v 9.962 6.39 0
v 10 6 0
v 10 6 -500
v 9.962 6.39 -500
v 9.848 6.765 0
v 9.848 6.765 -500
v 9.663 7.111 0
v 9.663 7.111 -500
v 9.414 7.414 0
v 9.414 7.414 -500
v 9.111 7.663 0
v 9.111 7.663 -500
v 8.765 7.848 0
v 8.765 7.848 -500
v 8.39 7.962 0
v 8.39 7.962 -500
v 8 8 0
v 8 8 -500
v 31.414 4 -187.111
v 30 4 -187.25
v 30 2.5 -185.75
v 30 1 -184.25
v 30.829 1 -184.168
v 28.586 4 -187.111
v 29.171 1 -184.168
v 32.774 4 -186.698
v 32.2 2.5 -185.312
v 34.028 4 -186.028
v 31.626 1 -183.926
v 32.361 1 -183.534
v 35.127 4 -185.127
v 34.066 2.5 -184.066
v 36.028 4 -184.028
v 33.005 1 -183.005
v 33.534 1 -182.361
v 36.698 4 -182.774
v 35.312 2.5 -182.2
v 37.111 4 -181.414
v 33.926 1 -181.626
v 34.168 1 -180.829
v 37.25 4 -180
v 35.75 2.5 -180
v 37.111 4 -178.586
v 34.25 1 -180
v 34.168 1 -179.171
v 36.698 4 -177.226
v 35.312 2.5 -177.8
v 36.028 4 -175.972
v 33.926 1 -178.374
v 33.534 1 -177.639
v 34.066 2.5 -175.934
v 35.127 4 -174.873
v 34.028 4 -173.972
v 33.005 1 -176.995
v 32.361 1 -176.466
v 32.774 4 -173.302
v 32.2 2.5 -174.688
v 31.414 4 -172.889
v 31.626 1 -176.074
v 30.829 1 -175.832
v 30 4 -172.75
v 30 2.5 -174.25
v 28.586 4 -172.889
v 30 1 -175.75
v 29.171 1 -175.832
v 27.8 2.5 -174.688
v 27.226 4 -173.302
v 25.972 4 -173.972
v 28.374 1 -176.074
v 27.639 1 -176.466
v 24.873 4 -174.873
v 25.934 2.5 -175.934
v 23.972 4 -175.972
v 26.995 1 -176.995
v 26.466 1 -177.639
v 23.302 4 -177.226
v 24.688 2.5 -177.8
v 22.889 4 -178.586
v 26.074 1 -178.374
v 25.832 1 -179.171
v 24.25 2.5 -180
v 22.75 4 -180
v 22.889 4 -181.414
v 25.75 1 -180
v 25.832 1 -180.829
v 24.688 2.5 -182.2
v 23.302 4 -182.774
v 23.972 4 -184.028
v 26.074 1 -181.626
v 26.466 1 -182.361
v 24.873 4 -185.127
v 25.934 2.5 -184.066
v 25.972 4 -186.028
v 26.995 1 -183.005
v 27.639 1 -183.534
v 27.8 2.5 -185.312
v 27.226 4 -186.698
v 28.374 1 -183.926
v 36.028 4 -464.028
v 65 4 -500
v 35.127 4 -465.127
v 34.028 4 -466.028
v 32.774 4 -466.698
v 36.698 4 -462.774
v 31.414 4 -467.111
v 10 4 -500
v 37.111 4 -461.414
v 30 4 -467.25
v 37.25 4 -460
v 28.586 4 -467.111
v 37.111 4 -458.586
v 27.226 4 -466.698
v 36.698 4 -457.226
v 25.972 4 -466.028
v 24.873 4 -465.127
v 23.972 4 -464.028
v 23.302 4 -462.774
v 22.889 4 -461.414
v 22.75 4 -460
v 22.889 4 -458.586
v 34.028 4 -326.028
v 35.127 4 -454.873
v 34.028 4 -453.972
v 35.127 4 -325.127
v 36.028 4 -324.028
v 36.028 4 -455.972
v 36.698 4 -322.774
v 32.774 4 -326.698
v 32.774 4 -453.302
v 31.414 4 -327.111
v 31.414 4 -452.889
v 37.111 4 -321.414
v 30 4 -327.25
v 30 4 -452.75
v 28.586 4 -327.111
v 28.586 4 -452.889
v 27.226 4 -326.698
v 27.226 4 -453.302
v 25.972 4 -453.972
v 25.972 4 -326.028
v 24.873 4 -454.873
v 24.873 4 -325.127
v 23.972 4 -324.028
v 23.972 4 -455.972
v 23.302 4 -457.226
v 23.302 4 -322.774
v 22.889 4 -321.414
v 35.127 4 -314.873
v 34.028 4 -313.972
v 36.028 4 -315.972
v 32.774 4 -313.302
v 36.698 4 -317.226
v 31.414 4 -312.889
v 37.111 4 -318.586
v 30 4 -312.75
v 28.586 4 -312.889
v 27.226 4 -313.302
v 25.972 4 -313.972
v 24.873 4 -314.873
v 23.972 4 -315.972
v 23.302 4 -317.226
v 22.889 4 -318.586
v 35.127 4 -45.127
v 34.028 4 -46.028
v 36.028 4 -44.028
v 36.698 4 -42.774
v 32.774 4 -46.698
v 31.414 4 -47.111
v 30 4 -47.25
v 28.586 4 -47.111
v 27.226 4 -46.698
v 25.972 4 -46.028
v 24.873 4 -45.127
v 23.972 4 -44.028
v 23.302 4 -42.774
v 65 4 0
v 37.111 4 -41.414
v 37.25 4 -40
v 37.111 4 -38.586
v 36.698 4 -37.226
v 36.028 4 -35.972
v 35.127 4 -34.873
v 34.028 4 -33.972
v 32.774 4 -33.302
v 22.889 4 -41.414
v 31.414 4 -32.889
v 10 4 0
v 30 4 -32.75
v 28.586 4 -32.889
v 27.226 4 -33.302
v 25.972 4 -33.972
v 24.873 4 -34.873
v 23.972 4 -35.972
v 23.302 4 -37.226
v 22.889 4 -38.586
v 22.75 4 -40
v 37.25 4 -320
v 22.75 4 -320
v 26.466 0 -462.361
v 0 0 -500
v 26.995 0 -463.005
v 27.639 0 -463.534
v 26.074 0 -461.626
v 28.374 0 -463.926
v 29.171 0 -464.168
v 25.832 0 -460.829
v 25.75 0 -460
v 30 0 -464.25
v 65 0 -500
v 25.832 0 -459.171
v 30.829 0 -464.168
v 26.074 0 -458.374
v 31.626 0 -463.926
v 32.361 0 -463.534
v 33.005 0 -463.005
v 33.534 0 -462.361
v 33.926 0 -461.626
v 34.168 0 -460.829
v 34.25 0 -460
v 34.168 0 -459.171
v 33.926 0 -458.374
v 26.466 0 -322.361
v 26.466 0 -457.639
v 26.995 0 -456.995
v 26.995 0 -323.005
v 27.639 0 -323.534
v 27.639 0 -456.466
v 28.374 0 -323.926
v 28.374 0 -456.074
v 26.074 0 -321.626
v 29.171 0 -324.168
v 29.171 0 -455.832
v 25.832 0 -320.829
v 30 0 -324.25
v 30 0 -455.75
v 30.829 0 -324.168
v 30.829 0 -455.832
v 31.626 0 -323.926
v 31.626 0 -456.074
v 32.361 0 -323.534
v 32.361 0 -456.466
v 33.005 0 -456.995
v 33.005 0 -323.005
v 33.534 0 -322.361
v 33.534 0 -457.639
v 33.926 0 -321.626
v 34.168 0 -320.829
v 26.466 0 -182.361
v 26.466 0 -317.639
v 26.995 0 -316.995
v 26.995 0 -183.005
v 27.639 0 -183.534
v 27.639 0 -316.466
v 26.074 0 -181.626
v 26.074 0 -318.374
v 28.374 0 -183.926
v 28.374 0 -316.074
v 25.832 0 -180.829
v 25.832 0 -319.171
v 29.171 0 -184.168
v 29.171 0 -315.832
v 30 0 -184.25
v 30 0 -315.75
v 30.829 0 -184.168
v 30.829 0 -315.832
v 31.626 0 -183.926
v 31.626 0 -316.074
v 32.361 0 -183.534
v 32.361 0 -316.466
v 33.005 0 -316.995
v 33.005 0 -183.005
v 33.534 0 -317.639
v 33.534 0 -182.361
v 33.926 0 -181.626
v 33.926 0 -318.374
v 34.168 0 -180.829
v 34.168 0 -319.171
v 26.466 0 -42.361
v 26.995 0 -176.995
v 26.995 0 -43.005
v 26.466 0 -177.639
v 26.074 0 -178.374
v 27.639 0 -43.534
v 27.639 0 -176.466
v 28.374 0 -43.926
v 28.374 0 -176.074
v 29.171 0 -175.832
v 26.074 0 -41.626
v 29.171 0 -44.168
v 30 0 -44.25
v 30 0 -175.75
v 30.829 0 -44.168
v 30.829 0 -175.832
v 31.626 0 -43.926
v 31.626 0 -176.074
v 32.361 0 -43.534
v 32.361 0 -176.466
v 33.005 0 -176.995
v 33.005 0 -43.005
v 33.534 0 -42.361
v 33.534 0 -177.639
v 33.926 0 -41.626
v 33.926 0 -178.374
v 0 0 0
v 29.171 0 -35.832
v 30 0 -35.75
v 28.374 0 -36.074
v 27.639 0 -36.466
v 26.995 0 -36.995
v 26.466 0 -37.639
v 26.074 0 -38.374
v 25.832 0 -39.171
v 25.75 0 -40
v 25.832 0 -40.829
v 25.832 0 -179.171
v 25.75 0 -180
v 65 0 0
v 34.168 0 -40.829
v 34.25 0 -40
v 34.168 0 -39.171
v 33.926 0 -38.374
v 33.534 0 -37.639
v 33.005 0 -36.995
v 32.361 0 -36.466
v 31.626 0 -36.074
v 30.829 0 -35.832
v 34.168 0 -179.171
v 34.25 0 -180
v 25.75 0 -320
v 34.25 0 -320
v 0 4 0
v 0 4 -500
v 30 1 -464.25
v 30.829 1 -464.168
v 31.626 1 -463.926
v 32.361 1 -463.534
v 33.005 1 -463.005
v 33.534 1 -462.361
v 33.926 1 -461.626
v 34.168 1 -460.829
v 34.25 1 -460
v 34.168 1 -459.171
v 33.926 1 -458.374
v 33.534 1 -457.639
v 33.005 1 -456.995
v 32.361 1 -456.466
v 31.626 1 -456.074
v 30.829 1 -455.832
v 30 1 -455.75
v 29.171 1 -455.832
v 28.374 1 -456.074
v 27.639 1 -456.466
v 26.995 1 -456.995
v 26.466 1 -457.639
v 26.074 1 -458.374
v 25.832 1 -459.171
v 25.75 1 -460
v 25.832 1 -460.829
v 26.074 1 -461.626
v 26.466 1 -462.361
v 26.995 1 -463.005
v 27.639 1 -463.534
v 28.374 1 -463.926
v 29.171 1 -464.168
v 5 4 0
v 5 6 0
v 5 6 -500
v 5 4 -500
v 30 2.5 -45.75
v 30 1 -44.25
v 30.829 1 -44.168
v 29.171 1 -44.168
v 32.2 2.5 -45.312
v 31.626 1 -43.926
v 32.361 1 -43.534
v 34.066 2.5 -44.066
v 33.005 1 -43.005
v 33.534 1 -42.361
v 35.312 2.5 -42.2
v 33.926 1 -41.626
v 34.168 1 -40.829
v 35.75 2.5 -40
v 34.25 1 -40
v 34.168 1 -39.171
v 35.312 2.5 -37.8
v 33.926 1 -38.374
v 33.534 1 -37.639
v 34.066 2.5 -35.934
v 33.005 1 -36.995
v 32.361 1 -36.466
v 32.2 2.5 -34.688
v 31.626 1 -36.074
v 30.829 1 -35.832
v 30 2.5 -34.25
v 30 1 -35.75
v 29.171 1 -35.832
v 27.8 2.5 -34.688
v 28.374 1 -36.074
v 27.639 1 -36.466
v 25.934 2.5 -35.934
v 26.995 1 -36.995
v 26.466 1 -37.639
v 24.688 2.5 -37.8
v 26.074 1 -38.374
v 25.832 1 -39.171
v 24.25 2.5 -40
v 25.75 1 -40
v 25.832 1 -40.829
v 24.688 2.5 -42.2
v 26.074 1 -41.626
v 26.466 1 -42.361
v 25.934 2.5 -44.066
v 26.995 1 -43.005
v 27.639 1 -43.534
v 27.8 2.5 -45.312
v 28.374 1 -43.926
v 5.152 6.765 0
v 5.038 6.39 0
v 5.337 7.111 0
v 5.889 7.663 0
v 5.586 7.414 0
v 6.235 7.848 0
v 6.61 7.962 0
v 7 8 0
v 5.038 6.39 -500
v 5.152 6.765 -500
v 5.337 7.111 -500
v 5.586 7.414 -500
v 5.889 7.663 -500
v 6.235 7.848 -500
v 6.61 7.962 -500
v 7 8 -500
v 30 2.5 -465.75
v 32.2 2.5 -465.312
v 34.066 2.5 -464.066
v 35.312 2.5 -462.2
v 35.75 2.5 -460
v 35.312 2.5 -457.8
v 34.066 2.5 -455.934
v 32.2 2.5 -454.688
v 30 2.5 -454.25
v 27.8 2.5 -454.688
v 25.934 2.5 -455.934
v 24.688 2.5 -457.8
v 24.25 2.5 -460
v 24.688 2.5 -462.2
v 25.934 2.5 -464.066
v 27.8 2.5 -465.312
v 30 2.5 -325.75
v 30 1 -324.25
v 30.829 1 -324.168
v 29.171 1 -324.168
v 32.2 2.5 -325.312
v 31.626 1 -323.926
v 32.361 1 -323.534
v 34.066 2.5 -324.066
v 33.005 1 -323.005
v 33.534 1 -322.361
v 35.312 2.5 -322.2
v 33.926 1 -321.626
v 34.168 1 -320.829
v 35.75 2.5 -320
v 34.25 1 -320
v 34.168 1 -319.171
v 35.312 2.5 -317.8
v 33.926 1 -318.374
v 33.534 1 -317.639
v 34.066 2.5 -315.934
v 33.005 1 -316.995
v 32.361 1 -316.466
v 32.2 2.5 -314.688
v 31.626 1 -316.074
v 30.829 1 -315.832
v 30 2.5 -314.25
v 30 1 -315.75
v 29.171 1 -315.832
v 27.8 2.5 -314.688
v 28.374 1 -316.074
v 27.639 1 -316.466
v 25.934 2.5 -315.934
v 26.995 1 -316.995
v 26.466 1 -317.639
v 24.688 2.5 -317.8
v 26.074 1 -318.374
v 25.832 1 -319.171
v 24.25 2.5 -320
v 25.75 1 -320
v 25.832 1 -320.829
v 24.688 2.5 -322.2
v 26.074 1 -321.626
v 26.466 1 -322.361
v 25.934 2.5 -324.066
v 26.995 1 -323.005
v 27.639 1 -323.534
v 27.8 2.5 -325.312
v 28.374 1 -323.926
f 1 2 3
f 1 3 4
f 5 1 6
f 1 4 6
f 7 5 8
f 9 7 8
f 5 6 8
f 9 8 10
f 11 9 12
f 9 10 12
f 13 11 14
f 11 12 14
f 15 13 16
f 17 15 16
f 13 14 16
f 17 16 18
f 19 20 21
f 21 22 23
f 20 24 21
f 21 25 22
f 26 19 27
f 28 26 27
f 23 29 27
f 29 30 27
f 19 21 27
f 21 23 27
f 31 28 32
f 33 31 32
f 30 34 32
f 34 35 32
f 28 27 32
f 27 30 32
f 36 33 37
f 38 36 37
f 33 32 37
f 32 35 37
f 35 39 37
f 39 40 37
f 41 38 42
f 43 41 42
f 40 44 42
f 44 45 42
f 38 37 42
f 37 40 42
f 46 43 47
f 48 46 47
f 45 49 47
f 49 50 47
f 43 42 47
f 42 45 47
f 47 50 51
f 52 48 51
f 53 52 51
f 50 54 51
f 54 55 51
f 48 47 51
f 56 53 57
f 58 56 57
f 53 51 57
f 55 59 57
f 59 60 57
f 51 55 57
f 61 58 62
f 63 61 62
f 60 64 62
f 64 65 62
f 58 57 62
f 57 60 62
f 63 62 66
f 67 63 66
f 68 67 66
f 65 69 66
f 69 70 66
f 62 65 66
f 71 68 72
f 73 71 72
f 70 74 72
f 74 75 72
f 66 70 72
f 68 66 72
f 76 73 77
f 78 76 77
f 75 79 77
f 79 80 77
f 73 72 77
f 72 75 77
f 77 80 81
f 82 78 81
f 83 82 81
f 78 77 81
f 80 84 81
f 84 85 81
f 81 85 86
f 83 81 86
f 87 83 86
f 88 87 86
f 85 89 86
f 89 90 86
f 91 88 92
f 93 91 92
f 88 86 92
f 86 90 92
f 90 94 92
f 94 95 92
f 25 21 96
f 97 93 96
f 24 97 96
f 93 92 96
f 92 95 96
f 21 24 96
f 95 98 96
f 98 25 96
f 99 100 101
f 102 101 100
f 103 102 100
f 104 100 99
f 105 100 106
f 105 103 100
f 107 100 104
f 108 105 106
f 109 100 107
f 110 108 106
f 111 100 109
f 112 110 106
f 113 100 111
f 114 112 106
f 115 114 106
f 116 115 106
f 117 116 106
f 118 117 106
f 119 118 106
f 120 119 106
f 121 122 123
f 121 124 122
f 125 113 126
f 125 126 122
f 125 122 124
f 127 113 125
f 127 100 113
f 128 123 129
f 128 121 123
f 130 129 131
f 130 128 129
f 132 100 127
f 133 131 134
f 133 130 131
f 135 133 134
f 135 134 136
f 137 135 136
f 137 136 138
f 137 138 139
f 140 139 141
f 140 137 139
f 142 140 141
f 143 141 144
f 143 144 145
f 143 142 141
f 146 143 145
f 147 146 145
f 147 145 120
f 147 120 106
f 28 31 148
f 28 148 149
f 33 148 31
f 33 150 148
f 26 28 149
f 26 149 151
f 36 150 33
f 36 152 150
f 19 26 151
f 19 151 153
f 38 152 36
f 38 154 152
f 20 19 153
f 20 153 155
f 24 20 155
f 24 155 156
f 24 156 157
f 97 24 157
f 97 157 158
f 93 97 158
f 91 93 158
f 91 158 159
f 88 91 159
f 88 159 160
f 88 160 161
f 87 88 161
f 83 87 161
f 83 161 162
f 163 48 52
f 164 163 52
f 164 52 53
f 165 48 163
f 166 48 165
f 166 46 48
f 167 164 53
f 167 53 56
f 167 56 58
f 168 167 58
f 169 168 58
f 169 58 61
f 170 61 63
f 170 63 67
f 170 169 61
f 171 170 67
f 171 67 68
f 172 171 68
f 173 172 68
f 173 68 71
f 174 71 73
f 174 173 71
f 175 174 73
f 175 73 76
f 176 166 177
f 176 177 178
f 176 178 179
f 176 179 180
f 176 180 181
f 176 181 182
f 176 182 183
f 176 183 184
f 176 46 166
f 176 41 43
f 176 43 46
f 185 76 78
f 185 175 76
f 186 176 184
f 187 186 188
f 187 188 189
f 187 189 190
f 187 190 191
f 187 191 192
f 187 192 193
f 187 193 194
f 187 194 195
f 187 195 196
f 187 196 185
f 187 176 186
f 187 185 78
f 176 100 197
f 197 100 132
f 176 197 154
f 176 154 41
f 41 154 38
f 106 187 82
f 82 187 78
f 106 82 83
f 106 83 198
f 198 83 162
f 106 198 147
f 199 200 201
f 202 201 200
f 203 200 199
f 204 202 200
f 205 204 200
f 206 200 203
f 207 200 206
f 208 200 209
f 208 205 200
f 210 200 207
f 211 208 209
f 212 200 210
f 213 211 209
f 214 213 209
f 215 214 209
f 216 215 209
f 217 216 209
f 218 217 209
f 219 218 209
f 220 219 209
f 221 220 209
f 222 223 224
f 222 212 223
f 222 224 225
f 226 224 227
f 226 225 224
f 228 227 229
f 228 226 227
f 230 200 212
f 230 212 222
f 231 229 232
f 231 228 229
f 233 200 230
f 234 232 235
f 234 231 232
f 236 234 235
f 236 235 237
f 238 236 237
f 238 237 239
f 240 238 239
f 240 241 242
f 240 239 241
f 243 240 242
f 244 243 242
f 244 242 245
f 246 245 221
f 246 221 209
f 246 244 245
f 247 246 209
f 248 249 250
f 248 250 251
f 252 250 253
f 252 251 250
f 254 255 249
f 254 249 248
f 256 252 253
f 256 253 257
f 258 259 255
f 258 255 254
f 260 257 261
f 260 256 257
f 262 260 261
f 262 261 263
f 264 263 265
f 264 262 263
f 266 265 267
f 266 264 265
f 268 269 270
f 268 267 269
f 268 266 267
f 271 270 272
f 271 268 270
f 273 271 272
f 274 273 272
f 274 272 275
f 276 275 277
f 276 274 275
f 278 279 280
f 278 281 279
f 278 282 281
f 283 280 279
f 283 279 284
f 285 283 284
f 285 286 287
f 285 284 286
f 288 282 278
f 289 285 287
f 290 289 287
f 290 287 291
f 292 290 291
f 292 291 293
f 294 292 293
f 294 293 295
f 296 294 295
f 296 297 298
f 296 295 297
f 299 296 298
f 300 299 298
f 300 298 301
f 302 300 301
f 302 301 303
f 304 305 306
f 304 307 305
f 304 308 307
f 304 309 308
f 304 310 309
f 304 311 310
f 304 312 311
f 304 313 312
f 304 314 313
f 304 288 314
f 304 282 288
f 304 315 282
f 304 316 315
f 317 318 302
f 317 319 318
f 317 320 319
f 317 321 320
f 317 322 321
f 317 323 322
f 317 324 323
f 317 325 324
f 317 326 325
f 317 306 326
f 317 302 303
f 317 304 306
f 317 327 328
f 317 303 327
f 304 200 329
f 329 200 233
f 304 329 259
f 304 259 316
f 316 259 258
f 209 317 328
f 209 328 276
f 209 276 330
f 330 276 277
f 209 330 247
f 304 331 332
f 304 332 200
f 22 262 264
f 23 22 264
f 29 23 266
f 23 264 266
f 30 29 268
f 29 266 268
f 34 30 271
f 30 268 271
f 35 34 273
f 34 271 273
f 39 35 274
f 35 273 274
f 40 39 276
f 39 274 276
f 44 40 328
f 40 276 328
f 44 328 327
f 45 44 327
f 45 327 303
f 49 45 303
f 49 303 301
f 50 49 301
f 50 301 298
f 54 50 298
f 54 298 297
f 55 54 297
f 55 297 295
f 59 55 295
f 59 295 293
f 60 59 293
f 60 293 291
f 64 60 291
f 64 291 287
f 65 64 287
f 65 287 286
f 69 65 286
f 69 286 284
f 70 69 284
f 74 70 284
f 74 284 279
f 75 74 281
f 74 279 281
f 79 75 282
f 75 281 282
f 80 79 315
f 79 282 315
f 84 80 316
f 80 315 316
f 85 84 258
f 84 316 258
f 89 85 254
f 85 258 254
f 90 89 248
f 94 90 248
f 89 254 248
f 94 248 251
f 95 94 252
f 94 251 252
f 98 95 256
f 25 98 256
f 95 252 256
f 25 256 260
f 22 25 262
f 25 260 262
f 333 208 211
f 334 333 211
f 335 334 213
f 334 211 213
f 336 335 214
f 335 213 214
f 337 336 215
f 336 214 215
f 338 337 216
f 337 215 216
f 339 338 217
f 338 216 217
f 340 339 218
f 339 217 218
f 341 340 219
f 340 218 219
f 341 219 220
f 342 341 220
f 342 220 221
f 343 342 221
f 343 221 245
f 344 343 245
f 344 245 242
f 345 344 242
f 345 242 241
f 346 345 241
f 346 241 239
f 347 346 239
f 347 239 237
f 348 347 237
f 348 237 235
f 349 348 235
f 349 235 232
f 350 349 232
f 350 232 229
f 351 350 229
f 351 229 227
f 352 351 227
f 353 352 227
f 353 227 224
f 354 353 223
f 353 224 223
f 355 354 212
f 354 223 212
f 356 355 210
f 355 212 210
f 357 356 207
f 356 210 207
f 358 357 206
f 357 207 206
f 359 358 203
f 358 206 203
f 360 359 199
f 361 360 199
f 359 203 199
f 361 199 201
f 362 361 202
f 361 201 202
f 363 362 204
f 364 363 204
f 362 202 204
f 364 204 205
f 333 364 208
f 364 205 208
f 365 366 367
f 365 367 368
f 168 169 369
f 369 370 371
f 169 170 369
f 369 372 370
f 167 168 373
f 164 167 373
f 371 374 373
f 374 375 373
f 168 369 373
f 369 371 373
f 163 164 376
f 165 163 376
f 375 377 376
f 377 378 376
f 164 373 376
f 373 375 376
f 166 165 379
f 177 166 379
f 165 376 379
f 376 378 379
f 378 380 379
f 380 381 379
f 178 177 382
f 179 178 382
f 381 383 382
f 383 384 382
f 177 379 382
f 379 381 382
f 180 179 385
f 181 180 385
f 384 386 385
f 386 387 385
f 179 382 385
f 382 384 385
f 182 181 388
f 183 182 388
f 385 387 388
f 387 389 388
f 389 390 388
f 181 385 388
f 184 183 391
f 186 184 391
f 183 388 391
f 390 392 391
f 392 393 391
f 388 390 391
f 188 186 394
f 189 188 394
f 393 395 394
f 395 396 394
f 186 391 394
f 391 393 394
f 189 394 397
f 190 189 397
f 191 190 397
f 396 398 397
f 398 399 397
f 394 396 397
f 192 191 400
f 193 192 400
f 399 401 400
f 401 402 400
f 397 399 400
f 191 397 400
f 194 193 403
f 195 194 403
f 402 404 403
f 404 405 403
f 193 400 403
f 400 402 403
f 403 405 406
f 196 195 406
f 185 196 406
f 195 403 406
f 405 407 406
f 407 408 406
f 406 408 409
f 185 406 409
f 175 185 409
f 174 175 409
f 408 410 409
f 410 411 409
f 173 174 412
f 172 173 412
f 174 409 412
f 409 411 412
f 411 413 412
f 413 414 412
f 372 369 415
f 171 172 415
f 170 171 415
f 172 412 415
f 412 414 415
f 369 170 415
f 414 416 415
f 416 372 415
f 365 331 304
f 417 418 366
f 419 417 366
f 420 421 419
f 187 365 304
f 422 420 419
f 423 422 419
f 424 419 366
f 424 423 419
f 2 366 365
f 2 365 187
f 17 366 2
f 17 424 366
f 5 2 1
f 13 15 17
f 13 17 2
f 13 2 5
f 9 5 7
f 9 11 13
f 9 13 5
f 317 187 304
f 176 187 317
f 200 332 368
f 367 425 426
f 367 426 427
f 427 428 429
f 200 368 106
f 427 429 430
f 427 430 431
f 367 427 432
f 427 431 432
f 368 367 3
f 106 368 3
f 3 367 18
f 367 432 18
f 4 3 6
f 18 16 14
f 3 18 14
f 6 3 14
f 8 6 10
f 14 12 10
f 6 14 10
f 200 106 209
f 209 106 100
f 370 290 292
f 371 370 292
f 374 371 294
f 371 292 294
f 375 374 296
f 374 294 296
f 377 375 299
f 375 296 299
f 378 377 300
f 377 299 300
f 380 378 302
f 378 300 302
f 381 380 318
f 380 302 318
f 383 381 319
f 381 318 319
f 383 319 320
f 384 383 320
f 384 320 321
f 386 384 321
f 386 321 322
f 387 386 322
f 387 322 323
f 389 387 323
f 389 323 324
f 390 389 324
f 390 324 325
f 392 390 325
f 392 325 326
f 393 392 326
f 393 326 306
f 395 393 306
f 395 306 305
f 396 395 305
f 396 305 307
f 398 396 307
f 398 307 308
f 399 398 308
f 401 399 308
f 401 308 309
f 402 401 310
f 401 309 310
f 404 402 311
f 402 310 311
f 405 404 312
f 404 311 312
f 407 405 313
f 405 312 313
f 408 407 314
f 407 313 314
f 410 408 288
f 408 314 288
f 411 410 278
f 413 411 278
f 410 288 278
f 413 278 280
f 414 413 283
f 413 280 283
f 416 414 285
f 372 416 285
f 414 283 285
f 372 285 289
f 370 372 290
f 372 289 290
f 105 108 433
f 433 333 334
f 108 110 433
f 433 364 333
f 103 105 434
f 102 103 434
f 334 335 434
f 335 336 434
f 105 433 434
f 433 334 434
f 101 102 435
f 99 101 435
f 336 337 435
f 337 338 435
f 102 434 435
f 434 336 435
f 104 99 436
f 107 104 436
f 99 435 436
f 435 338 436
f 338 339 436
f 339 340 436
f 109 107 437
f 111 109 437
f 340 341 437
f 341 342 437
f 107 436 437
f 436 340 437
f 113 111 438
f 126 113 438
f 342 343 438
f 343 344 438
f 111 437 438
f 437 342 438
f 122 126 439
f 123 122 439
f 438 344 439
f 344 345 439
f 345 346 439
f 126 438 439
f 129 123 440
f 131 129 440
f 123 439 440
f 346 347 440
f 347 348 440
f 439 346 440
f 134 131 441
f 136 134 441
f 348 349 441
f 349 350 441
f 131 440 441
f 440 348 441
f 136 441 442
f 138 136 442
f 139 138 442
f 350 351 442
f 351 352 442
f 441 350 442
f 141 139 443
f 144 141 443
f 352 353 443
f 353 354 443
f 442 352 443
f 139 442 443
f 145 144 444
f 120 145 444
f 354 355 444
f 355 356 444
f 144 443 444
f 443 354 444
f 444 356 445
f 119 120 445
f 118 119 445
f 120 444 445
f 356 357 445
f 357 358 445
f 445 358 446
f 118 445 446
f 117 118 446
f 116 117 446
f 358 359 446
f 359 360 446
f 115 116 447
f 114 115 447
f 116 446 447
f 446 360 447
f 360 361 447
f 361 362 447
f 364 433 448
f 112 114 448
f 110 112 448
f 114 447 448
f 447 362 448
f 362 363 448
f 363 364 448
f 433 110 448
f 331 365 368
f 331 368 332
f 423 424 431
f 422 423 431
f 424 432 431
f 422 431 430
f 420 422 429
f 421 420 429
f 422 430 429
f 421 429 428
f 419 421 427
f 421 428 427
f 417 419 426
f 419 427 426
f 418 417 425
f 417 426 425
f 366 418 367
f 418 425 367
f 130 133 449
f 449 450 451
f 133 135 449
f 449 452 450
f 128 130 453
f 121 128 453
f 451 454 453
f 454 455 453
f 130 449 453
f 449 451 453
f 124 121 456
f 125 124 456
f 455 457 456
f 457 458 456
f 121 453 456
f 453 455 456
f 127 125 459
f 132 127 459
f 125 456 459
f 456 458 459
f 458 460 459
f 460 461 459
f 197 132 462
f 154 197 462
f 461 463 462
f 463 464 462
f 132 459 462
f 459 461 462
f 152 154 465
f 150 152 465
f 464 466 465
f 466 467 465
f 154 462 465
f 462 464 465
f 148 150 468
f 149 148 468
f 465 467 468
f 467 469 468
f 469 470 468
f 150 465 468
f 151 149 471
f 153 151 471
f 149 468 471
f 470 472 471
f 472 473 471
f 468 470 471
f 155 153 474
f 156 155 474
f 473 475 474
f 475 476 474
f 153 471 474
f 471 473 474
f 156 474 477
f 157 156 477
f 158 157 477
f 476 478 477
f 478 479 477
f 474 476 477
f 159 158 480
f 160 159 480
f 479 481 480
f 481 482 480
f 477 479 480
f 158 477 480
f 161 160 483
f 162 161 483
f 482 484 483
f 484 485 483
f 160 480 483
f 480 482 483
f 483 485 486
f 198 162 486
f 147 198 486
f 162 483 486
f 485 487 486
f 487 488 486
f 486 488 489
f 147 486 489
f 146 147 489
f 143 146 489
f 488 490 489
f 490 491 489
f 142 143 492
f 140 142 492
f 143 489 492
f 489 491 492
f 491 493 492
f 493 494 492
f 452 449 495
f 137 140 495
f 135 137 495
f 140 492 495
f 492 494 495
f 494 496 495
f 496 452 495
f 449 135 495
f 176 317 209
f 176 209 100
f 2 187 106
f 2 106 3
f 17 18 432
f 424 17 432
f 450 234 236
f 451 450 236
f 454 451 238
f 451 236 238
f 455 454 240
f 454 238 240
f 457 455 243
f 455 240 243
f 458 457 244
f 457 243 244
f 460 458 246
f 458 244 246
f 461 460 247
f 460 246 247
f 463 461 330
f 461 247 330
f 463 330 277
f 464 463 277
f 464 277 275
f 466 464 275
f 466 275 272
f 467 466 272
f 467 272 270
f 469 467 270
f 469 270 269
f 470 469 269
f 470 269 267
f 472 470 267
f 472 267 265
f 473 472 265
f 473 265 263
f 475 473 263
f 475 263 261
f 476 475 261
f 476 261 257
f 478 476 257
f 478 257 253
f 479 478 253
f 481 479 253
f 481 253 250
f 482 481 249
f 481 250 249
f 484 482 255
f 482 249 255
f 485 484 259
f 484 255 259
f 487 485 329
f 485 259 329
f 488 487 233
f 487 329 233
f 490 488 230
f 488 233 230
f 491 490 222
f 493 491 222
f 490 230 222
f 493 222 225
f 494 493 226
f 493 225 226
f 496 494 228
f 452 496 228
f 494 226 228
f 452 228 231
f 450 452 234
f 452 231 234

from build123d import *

# Parameters (mm, degrees)
Y_KSEKLIK_EKSTR_ZYON1_DEPTH = 500
RADYUS1_R                   = 2
IZIM2_R                     = 4.25
KES_EKSTR_ZYON1_DEPTH       = 10
PAH1_SIZE                   = 3


with BuildPart() as part:
    # Çizim1 → Yükseklik-Ekstrüzyon1 (new body)
    with BuildSketch(Plane.XY):
        Polygon((0, 0), (65, 0), (65, 4), (10, 4), (10, 8), (5, 8), (5, 4), (0, 4), align=None)
    extrude(amount=-Y_KSEKLIK_EKSTR_ZYON1_DEPTH)

    # Radyus1
    radyus1_edges = [part.edges().sort_by_distance(p)[0] for p in [
        (5, 8, -250),
        (10, 8, -250),
    ]]
    fillet(radyus1_edges, radius=RADYUS1_R)

    # Çizim2 → Kes-Ekstrüzyon1 (cut)
    with BuildSketch(Plane.XZ):
        with Locations(Location((30, -40, 0), (0, 0, 270))):
            Circle(IZIM2_R)
        with Locations(Location((30, -180, 0), (0, 0, 270))):
            Circle(IZIM2_R)
        with Locations(Location((30, -320, 0), (0, 0, 270))):
            Circle(IZIM2_R)
        with Locations(Location((30, -460, 0), (0, 0, 270))):
            Circle(IZIM2_R)
    extrude(amount=-KES_EKSTR_ZYON1_DEPTH, mode=Mode.SUBTRACT)

    # Pah1
    pah1_edges = [part.edges().sort_by_distance(p)[0] for p in [
        (30, 4, -35.75),
        (30, 4, -175.75),
        (30, 4, -315.75),
        (30, 4, -455.75),
    ]]
    chamfer(pah1_edges, length=PAH1_SIZE)


solid = part.part
